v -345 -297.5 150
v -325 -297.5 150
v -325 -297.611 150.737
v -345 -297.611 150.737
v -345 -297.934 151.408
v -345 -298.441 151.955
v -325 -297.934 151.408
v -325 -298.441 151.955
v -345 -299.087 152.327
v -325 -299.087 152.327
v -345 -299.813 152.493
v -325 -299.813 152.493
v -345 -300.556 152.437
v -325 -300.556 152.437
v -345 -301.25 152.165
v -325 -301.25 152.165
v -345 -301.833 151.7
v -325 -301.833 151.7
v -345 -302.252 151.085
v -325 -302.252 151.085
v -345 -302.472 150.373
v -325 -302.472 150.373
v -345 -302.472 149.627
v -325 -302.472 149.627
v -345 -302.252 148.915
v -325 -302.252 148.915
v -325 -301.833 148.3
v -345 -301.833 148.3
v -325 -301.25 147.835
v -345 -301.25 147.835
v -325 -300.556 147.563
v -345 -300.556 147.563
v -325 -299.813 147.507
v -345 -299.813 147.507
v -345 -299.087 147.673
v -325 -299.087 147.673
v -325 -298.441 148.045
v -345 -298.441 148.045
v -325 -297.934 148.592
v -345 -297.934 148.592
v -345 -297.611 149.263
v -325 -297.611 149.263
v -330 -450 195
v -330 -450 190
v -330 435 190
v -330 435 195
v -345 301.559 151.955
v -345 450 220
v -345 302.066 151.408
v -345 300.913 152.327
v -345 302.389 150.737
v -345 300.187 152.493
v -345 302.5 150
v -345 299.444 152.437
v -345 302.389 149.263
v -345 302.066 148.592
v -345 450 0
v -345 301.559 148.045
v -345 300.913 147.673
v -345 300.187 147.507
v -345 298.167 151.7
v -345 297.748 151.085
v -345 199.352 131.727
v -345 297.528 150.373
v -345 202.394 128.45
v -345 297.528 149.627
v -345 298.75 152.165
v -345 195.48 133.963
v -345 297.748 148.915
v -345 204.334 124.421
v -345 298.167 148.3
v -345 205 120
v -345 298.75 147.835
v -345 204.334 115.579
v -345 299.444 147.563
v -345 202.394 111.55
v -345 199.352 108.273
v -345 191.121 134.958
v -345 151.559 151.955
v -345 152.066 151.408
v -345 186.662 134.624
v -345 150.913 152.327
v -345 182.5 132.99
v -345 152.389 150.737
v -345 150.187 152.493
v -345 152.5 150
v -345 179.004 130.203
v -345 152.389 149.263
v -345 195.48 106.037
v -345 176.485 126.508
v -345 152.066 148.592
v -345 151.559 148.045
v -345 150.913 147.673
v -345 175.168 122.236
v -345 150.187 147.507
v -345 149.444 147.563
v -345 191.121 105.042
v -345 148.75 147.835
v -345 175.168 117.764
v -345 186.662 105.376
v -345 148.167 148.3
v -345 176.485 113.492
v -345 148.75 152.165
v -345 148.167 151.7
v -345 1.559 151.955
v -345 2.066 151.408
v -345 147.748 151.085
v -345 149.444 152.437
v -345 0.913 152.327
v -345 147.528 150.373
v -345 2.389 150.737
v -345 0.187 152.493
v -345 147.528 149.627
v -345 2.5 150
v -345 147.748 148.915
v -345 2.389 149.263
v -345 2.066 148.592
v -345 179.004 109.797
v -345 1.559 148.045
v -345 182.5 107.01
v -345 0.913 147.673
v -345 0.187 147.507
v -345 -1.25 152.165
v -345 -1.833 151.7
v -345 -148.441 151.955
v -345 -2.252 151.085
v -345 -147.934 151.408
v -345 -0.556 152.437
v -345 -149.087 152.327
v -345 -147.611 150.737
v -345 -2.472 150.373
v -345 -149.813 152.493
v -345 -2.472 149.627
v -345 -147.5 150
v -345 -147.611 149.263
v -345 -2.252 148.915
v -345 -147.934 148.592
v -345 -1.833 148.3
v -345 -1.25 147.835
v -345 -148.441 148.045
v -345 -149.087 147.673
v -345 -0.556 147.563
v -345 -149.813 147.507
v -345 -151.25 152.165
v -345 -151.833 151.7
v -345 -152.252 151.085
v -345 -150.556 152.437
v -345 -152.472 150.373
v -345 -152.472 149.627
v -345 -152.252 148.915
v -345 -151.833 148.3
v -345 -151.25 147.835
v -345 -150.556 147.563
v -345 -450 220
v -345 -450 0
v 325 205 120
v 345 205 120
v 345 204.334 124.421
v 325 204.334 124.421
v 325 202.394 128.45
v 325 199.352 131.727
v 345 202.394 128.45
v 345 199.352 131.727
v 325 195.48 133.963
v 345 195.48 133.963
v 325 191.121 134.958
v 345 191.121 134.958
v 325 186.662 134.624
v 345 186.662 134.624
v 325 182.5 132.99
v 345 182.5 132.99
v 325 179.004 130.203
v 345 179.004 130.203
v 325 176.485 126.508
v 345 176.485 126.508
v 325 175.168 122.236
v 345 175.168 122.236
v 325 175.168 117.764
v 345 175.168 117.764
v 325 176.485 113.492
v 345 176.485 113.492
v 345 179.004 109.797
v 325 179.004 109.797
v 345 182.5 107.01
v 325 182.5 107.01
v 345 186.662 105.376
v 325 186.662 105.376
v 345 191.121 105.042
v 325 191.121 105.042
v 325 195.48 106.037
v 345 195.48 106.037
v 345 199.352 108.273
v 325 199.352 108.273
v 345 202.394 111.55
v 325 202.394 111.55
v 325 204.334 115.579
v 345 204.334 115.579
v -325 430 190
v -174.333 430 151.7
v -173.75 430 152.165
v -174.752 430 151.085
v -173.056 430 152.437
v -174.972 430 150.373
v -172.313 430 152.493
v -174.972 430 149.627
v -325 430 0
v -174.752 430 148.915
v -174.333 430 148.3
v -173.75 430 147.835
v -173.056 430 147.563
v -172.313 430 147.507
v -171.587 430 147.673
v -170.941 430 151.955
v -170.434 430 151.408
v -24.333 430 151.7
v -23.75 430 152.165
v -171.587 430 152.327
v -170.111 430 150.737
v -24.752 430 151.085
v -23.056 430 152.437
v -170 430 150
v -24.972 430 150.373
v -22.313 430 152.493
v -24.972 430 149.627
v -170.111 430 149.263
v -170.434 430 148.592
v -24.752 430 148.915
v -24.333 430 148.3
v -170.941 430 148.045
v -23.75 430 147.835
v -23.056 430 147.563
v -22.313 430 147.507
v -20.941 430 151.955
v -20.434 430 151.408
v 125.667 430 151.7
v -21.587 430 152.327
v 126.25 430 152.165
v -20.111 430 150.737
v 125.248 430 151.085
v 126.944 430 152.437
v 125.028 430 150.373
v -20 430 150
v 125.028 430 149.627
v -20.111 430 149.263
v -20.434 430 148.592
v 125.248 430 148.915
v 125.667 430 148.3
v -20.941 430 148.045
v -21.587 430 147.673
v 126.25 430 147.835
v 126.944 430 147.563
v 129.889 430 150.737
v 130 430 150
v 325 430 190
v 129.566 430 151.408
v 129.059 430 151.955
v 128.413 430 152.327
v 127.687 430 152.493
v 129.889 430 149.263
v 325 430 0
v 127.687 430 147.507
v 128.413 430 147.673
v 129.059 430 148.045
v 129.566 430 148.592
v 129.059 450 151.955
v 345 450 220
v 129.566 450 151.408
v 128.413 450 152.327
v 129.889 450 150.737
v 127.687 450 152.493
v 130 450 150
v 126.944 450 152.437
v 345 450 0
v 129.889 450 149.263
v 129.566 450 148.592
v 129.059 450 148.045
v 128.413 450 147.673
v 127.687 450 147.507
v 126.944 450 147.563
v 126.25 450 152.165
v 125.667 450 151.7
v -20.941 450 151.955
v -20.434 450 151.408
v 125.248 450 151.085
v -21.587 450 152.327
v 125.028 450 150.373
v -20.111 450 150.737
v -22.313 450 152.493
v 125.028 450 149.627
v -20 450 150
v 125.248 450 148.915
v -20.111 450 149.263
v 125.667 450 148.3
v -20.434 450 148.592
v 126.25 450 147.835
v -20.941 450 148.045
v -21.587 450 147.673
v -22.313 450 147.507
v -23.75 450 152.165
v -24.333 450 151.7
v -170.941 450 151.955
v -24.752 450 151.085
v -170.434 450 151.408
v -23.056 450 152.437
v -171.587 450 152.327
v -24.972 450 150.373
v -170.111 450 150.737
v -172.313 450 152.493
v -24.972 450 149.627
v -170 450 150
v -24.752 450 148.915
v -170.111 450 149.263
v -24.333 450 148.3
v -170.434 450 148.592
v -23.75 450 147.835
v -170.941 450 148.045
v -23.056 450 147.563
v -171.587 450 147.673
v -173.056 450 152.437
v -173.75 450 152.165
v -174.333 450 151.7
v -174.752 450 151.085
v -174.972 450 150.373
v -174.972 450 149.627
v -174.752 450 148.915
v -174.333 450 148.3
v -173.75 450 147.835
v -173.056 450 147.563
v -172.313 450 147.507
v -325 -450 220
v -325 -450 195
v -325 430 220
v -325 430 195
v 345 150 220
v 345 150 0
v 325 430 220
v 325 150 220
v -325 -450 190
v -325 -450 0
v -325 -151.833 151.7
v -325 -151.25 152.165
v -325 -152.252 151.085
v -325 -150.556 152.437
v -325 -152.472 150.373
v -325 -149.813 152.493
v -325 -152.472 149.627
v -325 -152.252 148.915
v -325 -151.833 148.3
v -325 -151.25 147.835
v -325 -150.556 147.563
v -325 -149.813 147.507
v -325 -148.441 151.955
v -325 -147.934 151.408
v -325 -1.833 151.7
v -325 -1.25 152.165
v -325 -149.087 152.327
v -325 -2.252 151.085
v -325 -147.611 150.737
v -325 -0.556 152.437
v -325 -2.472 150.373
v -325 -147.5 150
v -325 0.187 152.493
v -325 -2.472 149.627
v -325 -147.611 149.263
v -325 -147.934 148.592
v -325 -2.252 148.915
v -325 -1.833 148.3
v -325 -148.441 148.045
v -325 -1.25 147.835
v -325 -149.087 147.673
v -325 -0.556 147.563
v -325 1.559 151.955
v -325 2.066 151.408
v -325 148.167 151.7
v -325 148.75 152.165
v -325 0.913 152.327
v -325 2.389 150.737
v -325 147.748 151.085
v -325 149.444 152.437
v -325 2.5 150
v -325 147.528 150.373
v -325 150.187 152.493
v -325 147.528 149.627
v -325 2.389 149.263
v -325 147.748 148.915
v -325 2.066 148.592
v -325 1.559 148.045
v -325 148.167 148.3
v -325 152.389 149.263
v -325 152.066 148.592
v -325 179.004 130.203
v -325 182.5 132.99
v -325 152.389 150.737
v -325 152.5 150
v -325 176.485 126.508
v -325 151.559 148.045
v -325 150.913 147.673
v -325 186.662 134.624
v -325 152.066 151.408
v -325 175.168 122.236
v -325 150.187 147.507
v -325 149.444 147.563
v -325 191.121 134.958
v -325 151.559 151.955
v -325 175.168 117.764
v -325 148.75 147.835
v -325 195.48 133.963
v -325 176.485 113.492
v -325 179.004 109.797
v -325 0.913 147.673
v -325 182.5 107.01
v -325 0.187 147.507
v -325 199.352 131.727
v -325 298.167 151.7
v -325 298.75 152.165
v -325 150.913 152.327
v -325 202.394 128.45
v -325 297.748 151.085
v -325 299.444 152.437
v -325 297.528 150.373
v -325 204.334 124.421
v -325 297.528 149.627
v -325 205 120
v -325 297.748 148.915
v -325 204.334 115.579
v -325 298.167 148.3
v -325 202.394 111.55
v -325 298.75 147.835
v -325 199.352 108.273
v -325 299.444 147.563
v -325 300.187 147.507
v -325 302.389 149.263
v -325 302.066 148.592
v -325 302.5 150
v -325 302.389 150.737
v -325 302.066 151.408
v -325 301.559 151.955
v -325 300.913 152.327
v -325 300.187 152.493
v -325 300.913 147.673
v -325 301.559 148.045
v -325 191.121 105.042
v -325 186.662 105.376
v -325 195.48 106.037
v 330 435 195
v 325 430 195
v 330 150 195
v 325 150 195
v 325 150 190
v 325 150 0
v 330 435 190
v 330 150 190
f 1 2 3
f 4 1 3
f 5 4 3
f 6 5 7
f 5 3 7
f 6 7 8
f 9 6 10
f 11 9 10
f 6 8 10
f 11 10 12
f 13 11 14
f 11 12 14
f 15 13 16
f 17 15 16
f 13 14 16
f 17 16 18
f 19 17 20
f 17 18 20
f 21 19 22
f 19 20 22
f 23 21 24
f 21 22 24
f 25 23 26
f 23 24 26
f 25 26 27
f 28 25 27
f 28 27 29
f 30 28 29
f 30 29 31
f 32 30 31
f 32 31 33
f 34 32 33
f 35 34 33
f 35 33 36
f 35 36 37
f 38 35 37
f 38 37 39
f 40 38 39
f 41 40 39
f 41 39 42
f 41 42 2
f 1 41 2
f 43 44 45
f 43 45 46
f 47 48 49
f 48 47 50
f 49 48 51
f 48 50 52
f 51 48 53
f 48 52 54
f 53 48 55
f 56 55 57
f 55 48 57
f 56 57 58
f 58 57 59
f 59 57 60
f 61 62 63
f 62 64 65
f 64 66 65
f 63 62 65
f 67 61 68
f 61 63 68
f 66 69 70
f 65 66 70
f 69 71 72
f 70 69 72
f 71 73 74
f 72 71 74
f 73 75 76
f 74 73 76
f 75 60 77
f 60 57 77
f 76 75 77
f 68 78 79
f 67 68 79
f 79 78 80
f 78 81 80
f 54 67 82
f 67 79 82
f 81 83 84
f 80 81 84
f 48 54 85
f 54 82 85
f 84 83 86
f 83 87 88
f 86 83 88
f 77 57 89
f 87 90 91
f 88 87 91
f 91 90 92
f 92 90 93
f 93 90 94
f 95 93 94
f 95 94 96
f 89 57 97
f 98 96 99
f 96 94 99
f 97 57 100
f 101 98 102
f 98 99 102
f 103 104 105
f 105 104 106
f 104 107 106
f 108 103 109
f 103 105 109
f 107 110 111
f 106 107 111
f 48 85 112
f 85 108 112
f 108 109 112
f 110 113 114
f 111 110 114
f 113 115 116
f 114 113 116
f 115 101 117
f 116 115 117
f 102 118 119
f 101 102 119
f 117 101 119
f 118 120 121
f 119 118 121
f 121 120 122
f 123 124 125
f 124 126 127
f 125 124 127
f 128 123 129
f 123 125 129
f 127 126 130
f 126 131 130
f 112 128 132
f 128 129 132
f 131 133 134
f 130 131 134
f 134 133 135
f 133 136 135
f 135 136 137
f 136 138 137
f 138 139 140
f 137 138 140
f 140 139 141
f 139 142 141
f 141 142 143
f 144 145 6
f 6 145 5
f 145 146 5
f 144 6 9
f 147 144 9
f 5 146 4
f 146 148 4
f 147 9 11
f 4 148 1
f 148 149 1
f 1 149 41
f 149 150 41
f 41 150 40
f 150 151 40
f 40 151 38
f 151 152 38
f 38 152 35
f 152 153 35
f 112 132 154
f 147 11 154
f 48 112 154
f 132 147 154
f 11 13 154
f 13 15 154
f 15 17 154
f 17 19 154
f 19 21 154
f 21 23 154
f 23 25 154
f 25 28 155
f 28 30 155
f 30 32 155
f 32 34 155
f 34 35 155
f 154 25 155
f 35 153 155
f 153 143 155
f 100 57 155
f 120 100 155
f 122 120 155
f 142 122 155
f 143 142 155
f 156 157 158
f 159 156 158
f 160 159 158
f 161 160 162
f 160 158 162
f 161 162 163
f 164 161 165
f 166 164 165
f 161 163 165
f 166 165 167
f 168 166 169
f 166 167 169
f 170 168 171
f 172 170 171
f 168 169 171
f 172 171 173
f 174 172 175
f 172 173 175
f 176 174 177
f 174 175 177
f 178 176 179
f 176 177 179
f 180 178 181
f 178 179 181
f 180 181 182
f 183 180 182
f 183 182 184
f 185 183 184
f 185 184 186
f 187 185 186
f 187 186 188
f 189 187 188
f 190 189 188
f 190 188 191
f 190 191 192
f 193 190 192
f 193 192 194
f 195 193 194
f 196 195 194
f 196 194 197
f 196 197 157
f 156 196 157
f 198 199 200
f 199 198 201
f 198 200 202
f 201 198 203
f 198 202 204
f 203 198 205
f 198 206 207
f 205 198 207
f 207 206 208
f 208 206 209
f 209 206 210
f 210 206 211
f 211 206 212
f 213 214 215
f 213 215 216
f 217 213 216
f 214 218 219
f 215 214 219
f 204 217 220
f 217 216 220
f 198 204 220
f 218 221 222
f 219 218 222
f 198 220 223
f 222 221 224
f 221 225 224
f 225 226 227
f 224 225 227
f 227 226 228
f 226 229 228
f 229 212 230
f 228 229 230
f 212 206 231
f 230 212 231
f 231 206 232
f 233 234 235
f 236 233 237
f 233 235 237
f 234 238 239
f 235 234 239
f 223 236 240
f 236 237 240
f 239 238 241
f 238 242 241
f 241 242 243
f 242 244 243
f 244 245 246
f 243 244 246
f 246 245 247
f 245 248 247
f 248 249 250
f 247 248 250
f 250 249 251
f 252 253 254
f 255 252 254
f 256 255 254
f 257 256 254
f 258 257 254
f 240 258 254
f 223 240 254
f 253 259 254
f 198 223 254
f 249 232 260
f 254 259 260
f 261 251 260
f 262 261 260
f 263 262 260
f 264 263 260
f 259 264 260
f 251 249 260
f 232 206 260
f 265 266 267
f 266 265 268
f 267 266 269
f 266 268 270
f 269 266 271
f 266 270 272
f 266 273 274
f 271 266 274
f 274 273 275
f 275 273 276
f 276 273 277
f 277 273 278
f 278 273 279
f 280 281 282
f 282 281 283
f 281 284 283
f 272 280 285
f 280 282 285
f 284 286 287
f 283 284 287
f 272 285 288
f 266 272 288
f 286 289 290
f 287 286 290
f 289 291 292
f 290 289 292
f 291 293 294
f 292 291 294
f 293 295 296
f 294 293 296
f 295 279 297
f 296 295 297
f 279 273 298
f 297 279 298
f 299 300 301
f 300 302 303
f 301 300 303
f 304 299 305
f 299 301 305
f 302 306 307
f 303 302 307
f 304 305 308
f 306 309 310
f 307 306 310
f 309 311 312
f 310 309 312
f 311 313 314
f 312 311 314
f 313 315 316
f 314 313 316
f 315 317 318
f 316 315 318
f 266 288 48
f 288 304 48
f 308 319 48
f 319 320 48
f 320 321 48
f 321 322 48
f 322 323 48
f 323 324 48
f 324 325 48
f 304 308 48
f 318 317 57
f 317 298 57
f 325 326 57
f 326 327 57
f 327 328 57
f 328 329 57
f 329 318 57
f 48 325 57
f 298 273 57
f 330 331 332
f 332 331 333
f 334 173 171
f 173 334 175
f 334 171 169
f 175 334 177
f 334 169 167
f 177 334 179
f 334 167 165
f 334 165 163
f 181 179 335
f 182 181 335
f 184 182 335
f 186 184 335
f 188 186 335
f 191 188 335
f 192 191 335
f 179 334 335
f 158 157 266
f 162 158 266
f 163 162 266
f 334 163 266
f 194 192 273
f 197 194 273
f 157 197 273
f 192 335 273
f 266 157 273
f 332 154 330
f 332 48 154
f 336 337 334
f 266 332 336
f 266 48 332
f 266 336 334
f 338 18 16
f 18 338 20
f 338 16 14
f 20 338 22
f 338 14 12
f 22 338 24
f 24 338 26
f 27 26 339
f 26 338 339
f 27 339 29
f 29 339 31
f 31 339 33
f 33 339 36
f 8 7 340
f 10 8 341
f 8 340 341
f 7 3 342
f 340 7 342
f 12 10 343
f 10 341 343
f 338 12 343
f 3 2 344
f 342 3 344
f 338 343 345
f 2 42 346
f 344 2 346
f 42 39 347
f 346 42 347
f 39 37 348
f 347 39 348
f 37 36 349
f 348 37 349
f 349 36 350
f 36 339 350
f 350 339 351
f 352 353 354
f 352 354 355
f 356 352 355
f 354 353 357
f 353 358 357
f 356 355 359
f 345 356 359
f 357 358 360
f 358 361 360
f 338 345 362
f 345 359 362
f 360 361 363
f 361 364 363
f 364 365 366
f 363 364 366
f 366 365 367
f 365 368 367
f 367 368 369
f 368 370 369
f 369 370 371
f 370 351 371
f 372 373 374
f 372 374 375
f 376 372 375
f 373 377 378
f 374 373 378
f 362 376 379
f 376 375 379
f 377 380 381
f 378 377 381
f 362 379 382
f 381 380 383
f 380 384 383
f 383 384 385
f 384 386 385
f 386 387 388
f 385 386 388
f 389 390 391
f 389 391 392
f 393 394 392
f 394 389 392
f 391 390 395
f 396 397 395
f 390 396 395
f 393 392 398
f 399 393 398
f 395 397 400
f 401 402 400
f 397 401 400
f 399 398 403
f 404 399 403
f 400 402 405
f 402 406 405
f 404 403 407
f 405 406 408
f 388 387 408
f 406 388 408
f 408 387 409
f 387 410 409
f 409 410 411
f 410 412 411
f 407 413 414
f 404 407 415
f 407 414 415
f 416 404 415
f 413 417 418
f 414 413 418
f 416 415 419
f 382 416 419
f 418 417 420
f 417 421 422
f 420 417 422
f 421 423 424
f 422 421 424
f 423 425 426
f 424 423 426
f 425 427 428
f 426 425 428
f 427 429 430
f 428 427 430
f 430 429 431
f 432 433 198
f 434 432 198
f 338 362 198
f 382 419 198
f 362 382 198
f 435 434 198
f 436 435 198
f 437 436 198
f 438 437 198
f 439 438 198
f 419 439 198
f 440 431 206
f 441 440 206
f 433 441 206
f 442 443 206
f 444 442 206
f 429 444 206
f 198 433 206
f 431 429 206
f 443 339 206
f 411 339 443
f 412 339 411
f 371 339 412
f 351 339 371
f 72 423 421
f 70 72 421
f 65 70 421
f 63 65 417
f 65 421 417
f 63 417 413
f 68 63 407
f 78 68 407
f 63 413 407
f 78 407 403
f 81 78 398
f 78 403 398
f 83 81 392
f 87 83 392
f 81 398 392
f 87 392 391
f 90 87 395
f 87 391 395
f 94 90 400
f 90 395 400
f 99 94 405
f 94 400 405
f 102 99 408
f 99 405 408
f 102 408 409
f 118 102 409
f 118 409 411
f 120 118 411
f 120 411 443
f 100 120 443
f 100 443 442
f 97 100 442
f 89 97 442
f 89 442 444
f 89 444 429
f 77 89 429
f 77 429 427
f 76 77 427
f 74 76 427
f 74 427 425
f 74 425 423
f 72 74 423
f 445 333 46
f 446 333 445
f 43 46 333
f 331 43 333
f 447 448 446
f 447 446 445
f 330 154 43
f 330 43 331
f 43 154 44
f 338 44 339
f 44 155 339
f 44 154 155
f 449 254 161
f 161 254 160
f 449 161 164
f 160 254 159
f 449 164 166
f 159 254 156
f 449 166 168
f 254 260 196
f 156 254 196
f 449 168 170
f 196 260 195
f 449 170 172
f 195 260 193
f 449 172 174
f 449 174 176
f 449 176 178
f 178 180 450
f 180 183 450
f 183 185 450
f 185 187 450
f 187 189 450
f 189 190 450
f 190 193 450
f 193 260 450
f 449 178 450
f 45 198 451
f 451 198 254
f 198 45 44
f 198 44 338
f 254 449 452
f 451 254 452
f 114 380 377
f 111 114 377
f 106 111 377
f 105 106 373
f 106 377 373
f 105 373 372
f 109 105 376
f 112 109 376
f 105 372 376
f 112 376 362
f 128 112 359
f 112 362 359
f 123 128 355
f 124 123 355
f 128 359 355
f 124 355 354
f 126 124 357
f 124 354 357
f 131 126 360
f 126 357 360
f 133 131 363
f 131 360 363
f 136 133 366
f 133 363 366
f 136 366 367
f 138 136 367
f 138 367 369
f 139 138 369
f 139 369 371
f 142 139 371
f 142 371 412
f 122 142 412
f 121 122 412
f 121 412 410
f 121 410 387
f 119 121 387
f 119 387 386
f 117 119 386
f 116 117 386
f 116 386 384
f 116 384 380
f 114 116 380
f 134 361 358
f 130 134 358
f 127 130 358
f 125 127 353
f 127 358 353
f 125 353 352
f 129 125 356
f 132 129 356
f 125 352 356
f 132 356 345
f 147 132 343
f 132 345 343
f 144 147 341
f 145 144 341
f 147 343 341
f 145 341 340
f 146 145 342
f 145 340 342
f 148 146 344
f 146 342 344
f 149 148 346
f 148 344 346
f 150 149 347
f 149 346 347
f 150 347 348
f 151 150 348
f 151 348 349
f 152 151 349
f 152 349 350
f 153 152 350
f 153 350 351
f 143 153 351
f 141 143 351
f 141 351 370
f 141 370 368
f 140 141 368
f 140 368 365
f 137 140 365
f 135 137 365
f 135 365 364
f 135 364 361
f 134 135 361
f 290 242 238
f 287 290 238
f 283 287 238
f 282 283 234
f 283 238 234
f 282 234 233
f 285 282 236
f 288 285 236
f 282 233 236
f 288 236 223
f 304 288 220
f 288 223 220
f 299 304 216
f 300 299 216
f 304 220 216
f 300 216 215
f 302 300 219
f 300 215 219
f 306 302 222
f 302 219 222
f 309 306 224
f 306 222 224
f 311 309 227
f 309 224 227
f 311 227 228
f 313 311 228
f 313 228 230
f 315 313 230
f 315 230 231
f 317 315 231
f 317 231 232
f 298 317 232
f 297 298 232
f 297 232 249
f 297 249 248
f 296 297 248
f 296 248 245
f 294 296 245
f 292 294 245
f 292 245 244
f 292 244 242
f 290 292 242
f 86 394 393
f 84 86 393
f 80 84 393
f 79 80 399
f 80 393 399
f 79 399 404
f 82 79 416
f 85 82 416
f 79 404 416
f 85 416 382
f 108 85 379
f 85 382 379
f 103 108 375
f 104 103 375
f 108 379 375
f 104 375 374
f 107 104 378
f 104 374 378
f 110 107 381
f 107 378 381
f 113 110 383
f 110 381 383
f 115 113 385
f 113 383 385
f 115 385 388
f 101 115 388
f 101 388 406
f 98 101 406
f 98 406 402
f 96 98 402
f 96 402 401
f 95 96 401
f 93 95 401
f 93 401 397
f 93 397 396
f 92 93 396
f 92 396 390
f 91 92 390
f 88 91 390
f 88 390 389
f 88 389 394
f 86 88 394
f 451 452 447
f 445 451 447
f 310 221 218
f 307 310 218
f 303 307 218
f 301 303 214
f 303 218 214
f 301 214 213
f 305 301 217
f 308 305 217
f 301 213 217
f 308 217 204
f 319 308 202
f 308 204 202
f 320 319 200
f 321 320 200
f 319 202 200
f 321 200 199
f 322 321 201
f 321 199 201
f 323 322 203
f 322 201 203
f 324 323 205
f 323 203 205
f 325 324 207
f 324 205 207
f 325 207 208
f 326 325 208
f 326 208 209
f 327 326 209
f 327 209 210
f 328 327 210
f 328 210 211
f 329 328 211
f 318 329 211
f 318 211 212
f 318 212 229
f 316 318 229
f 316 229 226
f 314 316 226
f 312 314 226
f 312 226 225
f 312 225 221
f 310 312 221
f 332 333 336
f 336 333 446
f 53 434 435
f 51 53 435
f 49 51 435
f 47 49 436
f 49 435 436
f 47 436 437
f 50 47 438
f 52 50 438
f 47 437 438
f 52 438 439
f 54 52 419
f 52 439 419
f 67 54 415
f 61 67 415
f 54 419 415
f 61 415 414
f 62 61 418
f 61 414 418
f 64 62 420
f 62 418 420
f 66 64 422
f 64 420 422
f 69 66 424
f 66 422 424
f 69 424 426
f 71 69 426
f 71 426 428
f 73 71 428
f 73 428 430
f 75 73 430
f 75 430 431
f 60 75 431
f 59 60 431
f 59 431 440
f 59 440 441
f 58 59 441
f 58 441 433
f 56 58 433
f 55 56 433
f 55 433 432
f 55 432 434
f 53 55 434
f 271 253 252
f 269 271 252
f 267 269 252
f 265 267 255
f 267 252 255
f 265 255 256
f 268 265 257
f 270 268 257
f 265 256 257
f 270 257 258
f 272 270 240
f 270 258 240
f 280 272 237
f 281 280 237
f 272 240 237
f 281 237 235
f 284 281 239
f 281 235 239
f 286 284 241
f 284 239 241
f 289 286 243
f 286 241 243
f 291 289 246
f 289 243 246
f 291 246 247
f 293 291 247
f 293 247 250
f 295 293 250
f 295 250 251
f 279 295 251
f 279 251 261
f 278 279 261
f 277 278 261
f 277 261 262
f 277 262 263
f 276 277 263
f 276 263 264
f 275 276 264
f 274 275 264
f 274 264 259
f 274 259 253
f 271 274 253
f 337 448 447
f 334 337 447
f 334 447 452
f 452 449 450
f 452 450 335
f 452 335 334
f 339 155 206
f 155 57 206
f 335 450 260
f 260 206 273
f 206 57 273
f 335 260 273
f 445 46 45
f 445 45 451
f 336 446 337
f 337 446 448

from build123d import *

# Parameters (mm, degrees)
F1_DEPTH  = 220
F2_W      = 5
F2_H      = 5
F3_DEPTH  = 885
F4_W      = 650
F4_H      = 5
F5_DEPTH  = 5
F6_W      = 5
F6_H      = 5
F7_DEPTH  = 285
F8_R      = 15
F9_DEPTH  = 800
F10_R     = 2.5
F11_DEPTH = 25
F12_R     = 2.5
F13_DEPTH = 25


with BuildPart() as f1:
    # F0 (on Top) → F1 (new body)
    with BuildSketch(Plane.XY):
        Polygon((-345, -450), (-325, -450), (-325, -430), (-325, 430), (325, 430), (325, 150), (345, 150), (345, 450), (-345, 450), align=None)
    extrude(amount=F1_DEPTH)

    # F2 (on face) → F3 (cut)
    with BuildSketch(Plane.XZ.offset(450)):
        with Locations((-327.5, 192.5)):
            Rectangle(F2_W, F2_H)
    extrude(amount=-F3_DEPTH, mode=Mode.SUBTRACT)

    # F4 (on face) → F5 (cut)
    with BuildSketch(Plane.XZ.offset(-430)):
        with Locations((0, 192.5)):
            Rectangle(F4_W, F4_H)
    extrude(amount=-F5_DEPTH, mode=Mode.SUBTRACT)

    # F6 (on face) → F7 (cut)
    with BuildSketch(Plane.XZ.offset(-150)):
        with Locations((327.5, 192.5)):
            Rectangle(F6_W, F6_H)
    extrude(amount=-F7_DEPTH, mode=Mode.SUBTRACT)

    # F8 (on face) → F9 (cut)
    with BuildSketch(Plane.YZ.offset(345)):
        with Locations((190, 120)):
            Circle(F8_R)
    extrude(amount=-F9_DEPTH, mode=Mode.SUBTRACT)

    # F10 (on face) → F11 (cut)
    with BuildSketch(Plane.YZ.offset(-325)):
        with Locations((-300, 150)):
            Circle(F10_R)
        with Locations((-150, 150)):
            Circle(F10_R)
        with Locations((0, 150)):
            Circle(F10_R)
        with Locations((150, 150)):
            Circle(F10_R)
        with Locations((300, 150)):
            Circle(F10_R)
    extrude(amount=-F11_DEPTH, mode=Mode.SUBTRACT)

    # F12 (on face) → F13 (cut)
    with BuildSketch(Plane.XZ.offset(-430)):
        with Locations((-172.5, 150)):
            Circle(F12_R)
        with Locations((-22.5, 150)):
            Circle(F12_R)
        with Locations((127.5, 150)):
            Circle(F12_R)
    extrude(amount=-F13_DEPTH, mode=Mode.SUBTRACT)


solid = f1.part
